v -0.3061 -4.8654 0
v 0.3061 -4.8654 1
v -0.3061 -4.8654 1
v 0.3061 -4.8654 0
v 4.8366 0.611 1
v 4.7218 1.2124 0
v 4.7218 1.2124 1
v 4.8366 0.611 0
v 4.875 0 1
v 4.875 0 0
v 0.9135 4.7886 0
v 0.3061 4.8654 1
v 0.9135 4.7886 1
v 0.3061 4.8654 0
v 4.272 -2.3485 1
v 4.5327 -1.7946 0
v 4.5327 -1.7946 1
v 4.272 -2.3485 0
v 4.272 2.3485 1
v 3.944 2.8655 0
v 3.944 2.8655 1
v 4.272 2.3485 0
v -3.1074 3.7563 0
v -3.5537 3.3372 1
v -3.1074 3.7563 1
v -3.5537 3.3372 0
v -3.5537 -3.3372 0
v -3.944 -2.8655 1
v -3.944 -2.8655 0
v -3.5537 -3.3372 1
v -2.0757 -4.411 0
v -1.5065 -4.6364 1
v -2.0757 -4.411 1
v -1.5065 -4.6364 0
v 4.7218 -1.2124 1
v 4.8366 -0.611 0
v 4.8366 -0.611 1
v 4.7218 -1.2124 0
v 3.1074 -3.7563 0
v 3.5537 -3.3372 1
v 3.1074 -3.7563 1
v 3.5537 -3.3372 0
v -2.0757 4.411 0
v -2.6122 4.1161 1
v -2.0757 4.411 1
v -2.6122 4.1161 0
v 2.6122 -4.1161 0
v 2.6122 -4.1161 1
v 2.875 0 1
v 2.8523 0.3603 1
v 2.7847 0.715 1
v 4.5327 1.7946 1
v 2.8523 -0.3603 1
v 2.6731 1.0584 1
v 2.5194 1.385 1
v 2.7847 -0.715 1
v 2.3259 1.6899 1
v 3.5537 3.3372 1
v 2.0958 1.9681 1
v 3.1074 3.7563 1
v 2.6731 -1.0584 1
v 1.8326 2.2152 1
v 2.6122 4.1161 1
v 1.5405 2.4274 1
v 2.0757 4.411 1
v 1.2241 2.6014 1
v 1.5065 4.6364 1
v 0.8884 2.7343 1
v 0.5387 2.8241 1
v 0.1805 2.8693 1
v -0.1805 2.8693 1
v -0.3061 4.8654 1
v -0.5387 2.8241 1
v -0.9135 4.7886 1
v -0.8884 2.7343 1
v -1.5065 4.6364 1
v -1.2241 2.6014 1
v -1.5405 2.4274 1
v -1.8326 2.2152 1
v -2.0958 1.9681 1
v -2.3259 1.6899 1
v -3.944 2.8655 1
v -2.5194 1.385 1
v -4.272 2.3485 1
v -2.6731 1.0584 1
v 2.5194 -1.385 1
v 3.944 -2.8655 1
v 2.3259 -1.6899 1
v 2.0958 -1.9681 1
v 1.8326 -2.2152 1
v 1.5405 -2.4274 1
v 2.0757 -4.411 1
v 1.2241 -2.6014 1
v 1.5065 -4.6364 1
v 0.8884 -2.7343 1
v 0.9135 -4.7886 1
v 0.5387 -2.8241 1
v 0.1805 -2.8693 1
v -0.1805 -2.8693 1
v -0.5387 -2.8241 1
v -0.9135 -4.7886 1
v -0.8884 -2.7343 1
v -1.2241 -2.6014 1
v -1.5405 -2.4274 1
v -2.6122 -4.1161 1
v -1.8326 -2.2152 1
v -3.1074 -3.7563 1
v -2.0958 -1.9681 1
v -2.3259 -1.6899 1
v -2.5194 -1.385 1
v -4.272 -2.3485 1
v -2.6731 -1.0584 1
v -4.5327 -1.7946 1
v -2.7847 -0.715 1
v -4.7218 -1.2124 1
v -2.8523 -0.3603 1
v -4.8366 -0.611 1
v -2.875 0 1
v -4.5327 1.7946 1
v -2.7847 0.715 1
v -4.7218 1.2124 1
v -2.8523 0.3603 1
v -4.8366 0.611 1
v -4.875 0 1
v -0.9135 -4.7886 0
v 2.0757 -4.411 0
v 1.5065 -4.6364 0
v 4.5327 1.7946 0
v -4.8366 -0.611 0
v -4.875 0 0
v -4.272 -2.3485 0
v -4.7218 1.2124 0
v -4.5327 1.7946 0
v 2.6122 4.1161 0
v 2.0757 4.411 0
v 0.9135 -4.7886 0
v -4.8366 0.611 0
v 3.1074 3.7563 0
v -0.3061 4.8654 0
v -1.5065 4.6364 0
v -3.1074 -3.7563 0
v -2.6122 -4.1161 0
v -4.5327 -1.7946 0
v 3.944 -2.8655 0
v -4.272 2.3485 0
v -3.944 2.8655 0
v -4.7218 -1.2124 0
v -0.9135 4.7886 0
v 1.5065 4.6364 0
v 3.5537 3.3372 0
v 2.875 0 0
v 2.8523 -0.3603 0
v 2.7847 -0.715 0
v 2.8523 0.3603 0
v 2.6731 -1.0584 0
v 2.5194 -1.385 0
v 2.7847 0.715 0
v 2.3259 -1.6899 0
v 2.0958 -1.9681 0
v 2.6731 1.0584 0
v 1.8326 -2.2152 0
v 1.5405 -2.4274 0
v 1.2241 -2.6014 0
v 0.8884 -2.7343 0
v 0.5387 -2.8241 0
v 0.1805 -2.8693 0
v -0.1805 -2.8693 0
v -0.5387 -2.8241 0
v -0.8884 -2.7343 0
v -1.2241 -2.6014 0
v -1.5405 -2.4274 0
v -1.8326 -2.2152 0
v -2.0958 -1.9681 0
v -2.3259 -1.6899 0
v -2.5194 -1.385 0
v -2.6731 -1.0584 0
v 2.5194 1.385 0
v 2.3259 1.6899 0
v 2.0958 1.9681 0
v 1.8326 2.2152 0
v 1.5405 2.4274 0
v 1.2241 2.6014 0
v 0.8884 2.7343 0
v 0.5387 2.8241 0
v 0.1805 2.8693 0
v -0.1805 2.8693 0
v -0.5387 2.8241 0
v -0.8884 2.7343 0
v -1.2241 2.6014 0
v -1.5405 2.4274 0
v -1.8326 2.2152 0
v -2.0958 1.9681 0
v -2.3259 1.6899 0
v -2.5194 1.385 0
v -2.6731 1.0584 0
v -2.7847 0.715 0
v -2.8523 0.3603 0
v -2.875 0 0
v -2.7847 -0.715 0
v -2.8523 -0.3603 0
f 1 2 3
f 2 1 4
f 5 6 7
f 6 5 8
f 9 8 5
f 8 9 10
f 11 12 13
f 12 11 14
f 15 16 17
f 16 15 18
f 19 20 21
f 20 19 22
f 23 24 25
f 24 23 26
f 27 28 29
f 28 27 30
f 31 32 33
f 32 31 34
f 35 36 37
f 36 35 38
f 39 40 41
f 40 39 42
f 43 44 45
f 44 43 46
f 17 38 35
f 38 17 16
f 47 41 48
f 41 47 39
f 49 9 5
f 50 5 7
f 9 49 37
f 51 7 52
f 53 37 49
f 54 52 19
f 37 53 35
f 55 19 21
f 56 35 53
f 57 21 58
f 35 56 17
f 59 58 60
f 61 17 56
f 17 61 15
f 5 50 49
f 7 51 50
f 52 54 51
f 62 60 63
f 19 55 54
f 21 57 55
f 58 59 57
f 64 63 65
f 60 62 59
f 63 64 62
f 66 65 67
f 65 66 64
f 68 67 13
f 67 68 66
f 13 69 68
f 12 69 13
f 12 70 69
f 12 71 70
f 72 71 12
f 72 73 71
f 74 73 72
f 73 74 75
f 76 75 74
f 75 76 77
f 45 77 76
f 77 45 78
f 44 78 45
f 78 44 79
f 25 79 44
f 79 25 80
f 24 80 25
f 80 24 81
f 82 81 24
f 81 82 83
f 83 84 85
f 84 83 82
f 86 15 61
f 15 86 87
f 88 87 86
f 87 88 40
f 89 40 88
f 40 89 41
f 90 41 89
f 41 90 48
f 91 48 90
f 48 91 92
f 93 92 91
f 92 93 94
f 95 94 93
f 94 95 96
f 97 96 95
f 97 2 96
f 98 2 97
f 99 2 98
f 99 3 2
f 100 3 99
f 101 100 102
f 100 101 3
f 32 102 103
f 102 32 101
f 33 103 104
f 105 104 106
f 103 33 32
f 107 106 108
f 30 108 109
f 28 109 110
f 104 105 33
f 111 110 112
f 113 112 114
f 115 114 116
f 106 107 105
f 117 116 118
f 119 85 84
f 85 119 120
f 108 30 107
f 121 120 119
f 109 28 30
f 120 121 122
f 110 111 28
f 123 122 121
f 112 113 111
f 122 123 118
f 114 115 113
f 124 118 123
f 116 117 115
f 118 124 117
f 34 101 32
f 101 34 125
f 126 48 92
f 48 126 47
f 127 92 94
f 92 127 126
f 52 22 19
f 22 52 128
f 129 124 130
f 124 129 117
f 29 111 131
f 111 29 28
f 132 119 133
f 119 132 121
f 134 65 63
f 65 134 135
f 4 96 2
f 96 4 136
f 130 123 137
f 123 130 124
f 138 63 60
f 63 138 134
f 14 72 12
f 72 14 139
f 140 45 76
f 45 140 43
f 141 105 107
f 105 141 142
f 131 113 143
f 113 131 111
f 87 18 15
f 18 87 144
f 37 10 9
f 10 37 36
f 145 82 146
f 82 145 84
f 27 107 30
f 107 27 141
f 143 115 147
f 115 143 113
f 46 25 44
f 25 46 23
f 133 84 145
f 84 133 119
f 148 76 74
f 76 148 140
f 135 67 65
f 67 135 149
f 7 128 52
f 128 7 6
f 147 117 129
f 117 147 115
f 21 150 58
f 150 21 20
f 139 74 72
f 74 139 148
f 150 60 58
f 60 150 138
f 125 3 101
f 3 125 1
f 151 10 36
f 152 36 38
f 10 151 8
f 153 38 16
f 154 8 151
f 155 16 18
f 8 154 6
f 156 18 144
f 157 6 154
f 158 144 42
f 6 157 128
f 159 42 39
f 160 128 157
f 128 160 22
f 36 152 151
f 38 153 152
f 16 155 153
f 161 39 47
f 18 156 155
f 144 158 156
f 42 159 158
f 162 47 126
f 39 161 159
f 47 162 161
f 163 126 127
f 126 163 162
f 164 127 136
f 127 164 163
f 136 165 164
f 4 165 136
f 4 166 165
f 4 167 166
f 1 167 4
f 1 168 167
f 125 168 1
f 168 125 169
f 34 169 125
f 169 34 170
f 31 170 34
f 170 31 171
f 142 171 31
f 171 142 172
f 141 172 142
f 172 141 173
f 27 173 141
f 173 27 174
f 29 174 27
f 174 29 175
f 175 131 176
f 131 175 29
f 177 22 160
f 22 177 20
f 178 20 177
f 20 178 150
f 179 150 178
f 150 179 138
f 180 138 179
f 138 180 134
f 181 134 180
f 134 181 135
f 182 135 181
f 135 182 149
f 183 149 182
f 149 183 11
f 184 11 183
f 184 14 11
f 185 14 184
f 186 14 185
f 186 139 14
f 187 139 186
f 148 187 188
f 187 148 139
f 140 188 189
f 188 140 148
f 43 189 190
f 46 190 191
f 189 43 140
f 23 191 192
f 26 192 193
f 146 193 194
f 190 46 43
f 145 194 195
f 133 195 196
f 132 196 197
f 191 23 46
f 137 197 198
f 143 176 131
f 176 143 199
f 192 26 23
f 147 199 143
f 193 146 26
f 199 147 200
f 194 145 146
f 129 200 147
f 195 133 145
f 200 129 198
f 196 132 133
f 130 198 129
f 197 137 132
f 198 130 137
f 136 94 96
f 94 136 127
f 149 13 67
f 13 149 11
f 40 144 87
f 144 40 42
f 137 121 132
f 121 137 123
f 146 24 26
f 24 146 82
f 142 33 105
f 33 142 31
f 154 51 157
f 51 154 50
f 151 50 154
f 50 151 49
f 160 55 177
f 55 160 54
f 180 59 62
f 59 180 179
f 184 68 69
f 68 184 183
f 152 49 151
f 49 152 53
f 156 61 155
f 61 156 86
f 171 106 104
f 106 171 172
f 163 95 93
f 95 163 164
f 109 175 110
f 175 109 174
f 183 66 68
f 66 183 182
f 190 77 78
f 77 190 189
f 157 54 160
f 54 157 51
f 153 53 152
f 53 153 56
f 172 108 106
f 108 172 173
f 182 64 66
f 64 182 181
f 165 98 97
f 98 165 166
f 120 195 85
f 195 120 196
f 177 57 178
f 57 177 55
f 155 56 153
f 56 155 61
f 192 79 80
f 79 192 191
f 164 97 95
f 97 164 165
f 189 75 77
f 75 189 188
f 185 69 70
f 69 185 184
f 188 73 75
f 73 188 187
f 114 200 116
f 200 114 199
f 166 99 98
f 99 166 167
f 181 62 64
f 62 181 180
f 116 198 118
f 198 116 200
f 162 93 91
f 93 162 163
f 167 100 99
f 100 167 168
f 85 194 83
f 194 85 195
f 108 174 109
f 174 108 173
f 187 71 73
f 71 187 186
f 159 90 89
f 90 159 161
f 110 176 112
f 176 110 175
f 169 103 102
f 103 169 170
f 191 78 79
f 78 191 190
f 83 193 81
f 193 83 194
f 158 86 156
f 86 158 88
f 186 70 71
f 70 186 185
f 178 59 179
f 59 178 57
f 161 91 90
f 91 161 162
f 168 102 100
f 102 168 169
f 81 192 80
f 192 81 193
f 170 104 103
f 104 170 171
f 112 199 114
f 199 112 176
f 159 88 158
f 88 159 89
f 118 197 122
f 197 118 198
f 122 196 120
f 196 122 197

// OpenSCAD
// diameter
inner = 5.75;

// diameter
outer = 9.75;


thickness = 1;

module washer (inner, outer, thickness) {

    difference() {
        cylinder(d=outer, h=thickness, $fn=50);
        translate([0,0,-thickness])
        cylinder(d=inner, h=thickness*3, $fn=50);
    };
}

// dimensions in mm
washer (inner, outer, thickness);
